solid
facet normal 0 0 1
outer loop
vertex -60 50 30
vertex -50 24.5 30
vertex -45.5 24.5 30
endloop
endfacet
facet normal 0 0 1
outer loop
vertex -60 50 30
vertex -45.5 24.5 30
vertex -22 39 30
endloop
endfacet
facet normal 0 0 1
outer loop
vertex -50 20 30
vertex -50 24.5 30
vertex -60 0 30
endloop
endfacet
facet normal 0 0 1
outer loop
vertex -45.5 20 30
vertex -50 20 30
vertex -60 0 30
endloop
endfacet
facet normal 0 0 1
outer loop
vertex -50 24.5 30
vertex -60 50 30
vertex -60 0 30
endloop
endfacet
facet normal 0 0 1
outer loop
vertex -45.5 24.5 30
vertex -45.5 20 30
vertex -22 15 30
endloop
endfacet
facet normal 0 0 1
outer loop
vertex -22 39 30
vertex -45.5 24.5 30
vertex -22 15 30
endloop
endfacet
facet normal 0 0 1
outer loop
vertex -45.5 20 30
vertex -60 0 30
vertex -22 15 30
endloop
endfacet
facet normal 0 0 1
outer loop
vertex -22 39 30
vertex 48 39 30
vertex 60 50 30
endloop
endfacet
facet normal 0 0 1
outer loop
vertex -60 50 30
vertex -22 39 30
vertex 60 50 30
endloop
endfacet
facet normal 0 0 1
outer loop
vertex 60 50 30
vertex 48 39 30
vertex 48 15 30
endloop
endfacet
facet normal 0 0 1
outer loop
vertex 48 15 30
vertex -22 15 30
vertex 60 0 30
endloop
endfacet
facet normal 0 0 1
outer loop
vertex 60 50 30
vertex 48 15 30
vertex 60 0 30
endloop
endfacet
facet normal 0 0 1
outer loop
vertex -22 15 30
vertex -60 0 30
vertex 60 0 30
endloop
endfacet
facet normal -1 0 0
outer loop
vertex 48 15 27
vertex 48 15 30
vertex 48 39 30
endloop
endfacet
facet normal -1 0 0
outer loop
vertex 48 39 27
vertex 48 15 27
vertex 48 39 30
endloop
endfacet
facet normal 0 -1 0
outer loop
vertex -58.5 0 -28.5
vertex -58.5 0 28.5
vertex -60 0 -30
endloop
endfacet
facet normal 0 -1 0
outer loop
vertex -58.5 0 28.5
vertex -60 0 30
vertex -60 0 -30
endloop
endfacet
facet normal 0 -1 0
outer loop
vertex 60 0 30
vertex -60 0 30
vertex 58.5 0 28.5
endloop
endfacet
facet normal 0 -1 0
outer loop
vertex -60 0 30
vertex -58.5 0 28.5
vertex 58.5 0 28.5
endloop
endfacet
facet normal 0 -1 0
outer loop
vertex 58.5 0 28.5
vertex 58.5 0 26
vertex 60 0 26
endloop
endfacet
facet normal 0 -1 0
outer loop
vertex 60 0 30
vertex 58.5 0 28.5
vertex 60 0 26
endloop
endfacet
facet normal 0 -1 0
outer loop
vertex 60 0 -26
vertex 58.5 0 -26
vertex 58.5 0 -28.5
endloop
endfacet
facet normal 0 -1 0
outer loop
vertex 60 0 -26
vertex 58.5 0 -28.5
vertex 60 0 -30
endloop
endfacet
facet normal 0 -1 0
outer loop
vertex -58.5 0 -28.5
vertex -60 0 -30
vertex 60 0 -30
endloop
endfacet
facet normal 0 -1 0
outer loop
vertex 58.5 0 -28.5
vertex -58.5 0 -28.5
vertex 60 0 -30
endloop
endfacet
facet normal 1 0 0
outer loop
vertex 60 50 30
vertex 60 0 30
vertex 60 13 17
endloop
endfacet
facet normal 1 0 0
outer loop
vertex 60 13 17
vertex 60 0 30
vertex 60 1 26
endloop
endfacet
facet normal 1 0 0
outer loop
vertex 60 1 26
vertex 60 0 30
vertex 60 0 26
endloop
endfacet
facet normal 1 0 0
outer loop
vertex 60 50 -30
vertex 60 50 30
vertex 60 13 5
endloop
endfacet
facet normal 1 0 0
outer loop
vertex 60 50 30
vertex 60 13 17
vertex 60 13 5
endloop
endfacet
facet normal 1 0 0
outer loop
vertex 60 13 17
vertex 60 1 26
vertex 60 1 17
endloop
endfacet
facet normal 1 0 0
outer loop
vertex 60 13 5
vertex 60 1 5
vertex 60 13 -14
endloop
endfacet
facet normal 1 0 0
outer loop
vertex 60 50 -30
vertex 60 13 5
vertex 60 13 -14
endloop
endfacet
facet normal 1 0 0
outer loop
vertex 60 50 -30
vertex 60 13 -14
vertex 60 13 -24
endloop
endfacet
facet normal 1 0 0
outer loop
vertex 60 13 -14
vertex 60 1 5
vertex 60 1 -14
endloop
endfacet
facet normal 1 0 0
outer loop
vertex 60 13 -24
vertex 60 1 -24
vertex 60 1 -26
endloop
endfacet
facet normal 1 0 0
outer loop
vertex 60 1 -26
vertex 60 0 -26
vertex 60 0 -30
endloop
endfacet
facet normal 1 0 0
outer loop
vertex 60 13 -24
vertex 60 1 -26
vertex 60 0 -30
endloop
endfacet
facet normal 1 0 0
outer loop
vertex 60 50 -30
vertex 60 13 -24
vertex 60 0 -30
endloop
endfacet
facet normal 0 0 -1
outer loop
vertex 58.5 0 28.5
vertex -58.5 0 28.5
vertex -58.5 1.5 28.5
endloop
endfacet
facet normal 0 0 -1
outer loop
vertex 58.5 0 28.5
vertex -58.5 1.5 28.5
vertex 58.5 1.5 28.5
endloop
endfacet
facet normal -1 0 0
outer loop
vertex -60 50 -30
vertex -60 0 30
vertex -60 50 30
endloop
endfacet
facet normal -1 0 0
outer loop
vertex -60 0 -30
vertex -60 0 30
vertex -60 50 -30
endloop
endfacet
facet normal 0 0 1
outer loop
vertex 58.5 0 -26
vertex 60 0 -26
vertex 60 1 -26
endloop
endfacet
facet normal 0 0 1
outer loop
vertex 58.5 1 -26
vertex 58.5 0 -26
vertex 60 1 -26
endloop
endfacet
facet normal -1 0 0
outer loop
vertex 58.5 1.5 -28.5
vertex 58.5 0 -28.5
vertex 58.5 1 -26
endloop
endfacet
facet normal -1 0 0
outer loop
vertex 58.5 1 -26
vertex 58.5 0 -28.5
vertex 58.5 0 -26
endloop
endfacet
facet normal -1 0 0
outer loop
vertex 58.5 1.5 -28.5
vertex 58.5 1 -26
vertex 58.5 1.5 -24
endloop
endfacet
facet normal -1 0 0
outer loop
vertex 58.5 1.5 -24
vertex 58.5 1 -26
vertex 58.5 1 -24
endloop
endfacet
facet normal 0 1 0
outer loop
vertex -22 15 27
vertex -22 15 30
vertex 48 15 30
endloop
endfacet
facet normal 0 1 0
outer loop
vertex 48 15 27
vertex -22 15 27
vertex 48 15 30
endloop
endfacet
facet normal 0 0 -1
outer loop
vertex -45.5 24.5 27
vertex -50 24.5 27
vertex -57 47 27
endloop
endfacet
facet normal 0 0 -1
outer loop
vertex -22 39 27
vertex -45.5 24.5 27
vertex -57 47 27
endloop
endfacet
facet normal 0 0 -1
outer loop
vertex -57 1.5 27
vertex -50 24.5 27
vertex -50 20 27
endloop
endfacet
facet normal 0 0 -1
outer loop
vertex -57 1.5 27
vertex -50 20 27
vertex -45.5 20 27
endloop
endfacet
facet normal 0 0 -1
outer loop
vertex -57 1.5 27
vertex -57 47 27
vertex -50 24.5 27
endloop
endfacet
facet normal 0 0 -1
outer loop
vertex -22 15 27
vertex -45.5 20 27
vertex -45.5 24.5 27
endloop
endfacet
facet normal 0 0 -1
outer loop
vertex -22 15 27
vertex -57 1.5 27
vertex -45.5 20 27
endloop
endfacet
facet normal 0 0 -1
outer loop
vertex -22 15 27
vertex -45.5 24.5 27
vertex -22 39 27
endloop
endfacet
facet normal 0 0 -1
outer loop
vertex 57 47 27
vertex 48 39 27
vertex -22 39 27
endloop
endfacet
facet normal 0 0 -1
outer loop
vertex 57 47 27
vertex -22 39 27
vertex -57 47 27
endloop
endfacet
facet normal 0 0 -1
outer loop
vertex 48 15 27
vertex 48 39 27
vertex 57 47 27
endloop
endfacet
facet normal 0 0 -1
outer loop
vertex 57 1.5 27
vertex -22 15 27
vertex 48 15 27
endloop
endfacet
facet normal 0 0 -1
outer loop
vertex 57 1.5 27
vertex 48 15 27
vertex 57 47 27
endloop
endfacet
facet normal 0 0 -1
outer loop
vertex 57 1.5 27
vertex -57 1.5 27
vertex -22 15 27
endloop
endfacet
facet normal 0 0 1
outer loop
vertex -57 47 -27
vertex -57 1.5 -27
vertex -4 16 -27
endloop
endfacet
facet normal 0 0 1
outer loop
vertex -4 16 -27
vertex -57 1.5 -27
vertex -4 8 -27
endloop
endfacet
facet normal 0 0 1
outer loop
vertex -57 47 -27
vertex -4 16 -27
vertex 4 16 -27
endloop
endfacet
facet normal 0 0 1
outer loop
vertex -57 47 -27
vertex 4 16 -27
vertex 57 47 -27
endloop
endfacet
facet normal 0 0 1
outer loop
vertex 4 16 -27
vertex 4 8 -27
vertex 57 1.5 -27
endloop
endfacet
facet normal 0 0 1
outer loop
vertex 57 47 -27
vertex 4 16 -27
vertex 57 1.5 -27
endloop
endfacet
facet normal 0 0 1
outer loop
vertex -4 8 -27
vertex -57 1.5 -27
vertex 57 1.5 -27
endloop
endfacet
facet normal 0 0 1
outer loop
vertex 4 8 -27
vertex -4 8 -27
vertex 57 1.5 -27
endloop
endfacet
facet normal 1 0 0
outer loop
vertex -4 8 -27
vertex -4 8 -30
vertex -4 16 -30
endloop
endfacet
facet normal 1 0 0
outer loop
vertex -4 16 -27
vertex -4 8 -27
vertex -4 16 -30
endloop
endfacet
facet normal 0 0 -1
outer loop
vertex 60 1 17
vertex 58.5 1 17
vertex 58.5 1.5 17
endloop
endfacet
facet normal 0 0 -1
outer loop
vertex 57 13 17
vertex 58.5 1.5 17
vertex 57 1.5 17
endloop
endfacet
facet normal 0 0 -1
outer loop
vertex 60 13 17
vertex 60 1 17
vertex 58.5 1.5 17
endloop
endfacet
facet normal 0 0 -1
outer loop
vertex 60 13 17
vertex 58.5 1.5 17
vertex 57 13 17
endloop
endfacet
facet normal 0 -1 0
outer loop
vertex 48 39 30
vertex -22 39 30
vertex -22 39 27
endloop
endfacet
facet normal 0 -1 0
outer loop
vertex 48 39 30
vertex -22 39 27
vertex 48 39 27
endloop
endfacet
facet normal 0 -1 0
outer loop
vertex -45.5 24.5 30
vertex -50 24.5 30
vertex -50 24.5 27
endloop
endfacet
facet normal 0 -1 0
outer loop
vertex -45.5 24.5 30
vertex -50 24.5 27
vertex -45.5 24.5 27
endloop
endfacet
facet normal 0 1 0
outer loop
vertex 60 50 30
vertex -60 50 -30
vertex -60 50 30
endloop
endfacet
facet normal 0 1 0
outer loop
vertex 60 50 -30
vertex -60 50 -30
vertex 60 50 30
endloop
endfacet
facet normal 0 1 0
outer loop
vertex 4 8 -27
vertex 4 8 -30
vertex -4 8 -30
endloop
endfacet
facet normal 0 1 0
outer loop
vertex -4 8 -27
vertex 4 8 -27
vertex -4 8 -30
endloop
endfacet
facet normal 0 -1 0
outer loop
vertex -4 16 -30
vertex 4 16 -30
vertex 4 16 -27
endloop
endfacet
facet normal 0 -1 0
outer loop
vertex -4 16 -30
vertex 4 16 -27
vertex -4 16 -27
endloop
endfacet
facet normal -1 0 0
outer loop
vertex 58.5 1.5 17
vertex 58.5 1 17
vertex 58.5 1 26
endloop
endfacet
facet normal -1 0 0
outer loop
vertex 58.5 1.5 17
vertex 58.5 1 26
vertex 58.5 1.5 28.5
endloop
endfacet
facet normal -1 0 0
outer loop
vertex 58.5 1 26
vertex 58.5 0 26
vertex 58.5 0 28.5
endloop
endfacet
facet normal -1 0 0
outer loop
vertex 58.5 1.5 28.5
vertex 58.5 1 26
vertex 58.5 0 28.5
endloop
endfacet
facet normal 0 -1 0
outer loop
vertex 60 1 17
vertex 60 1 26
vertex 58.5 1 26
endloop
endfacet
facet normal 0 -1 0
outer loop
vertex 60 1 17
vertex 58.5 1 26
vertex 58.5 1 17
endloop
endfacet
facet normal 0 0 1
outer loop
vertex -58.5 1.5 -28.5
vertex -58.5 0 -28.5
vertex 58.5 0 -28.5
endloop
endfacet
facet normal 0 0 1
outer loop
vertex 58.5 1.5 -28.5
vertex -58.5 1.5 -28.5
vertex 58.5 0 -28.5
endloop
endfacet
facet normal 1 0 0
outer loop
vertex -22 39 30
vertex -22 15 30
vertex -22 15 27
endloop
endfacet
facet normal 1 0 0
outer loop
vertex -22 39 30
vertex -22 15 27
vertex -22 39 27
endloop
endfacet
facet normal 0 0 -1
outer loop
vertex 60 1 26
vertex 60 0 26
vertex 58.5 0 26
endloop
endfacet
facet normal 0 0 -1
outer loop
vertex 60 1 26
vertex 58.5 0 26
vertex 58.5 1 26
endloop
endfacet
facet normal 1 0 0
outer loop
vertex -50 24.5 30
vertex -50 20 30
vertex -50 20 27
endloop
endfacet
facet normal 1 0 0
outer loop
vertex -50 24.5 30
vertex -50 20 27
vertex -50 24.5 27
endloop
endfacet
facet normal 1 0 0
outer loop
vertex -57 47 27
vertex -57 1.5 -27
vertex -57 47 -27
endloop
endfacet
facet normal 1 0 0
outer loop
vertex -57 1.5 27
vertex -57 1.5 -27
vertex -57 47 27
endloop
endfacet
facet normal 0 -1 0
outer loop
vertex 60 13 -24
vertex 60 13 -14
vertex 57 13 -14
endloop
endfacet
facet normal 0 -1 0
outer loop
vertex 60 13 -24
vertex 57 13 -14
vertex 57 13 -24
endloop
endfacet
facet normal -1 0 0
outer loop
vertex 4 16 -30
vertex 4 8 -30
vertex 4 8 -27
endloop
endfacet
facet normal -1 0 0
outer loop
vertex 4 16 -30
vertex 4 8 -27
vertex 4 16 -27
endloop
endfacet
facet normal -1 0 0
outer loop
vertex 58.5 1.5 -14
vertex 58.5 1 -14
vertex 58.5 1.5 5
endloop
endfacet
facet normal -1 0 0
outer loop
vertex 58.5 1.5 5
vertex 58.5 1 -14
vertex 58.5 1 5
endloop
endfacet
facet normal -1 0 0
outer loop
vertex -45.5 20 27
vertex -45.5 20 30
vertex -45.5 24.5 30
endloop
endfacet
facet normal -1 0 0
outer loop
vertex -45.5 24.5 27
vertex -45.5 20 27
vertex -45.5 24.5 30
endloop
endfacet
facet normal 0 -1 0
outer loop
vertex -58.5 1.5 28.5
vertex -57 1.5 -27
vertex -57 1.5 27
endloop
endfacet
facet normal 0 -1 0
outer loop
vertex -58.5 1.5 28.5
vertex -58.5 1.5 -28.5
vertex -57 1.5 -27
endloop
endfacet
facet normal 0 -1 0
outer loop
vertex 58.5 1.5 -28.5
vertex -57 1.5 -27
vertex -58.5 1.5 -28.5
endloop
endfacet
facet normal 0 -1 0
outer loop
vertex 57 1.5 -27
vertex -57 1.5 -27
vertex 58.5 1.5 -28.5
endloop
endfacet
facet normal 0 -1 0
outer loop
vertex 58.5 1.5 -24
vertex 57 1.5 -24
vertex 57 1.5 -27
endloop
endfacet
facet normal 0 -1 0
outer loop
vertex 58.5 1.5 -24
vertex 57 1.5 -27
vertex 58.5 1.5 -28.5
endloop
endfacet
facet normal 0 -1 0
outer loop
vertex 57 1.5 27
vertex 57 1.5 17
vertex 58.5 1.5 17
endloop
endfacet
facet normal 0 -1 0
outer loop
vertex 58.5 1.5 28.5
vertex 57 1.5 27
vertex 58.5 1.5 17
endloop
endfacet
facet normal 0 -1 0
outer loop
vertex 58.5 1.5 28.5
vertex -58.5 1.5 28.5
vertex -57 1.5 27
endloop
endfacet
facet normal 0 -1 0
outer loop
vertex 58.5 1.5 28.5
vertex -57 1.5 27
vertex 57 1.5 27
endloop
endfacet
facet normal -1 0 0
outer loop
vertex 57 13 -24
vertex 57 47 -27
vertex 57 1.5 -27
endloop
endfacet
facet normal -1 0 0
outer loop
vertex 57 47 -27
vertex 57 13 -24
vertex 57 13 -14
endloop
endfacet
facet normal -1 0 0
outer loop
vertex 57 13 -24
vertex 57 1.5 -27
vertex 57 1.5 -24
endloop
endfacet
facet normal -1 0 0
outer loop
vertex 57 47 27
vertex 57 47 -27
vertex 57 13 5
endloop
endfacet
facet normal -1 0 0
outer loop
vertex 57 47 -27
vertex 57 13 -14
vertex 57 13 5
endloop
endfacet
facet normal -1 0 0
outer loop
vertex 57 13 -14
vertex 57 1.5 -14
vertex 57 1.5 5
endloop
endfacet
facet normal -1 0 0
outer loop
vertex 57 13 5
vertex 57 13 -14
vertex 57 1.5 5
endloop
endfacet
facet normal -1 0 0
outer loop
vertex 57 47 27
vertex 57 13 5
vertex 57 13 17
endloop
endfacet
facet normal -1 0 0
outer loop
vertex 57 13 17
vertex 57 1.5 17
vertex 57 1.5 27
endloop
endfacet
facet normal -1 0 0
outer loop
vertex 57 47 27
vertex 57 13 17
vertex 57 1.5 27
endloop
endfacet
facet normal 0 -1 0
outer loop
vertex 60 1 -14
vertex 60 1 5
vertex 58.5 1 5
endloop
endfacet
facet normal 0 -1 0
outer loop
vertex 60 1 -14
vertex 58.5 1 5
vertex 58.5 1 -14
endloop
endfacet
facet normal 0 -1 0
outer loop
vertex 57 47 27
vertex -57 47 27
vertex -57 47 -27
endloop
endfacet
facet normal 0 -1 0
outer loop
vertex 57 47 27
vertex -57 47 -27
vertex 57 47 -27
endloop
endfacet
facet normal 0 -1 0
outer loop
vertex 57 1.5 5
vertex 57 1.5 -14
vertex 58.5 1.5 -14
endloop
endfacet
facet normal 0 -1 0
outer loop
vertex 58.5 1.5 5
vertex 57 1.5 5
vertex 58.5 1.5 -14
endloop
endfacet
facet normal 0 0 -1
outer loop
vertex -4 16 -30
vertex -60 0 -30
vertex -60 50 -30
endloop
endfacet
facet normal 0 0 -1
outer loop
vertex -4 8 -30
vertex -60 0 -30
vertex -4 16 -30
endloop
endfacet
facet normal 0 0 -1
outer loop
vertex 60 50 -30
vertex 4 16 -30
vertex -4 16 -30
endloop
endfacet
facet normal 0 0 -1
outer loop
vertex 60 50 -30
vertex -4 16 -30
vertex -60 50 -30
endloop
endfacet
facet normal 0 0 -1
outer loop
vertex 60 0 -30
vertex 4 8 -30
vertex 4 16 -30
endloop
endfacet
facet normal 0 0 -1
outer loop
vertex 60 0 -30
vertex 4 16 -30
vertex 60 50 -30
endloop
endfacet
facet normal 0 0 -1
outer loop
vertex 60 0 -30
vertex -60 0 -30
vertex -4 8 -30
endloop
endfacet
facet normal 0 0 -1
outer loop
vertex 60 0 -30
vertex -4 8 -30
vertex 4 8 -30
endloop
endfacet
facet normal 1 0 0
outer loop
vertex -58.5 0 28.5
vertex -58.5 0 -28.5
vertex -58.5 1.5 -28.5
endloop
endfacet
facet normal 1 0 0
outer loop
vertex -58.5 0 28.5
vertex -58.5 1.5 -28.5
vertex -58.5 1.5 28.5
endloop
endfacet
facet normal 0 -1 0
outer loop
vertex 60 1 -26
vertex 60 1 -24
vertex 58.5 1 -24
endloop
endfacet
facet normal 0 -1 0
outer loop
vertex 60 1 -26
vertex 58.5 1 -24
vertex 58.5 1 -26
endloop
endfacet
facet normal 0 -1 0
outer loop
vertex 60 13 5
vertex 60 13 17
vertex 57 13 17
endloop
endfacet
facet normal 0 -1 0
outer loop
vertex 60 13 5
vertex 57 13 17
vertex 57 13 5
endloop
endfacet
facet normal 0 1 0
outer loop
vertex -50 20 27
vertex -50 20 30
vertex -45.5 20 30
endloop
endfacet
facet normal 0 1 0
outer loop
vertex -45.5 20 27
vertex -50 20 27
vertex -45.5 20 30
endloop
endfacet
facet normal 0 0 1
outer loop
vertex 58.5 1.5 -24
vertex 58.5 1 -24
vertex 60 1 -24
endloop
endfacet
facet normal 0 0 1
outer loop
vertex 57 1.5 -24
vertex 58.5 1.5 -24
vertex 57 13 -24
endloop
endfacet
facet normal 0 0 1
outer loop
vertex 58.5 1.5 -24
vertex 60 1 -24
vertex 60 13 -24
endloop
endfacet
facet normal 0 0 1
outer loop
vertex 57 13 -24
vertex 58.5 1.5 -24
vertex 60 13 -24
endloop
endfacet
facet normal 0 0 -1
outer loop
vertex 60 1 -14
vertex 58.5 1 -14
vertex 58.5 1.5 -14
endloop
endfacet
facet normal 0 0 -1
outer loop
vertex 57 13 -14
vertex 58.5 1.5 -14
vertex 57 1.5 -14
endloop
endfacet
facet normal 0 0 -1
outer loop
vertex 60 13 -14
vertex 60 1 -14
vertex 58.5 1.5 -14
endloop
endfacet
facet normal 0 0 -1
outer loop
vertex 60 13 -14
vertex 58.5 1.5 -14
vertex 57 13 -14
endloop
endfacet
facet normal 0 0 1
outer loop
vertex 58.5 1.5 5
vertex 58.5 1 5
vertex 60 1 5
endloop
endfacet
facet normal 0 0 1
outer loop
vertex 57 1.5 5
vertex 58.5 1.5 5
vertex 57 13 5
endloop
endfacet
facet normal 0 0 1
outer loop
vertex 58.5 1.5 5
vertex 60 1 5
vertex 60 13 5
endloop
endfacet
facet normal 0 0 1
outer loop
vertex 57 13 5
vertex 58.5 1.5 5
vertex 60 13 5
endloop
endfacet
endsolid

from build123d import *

# Parameters (mm, degrees)
SKETCH1_W           = 120
SKETCH1_H           = 60
BOSS_EXTRUDE1_DEPTH = 50
SKETCH2_W           = 114
SKETCH2_H           = 54
CUT_EXTRUDE1_DEPTH  = 47
SKETCH5_W           = 70
SKETCH5_H           = 24
CUT_EXTRUDE3_DEPTH  = 7
SKETCH6_W           = 4.5
SKETCH6_H           = 4.5
CUT_EXTRUDE4_DEPTH  = 7
SKETCH7_W           = 12
SKETCH7_H           = 13
SKETCH7_W_2         = 10
CUT_EXTRUDE5_DEPTH  = 3
SKETCH8_W           = 52
SKETCH8_H           = 2
CUT_EXTRUDE6_DEPTH  = 13
SKETCH9_W           = 117
SKETCH9_H           = 57
CUT_EXTRUDE7_DEPTH  = 1.5
SKETCH10_W          = 8
SKETCH10_H          = 8
CUT_EXTRUDE8_DEPTH  = 11.5


with BuildPart() as part:
    # Sketch1 → Boss-Extrude1 (new body)
    with BuildSketch(Plane(origin=(0, 0, 0), x_dir=(1, 0, 0), z_dir=(0, 1, 0))):
        Rectangle(SKETCH1_W, SKETCH1_H)
    extrude(amount=BOSS_EXTRUDE1_DEPTH)

    # Sketch2 → Cut-Extrude1 (cut)
    with BuildSketch(Plane.XZ):
        Rectangle(SKETCH2_W, SKETCH2_H)
    extrude(amount=-CUT_EXTRUDE1_DEPTH, mode=Mode.SUBTRACT)

    # Sketch5 → Cut-Extrude3 (cut)
    with BuildSketch(Plane.XY.offset(30)):
        with Locations((13, 27)):
            Rectangle(SKETCH5_W, SKETCH5_H)
    extrude(amount=-CUT_EXTRUDE3_DEPTH, mode=Mode.SUBTRACT)

    # Sketch6 → Cut-Extrude4 (cut)
    with BuildSketch(Plane.XY.offset(30)):
        with Locations((-47.75, 22.25)):
            Rectangle(SKETCH6_W, SKETCH6_H)
    extrude(amount=-CUT_EXTRUDE4_DEPTH, mode=Mode.SUBTRACT)

    # Sketch7 → Cut-Extrude5 (cut)
    with BuildSketch(Plane(origin=(60, 0, 0), x_dir=(0, 0, -1), z_dir=(1, 0, 0))):
        with Locations((-11, 6.5)):
            Rectangle(SKETCH7_W, SKETCH7_H)
        with Locations((19, 6.5)):
            Rectangle(SKETCH7_W_2, SKETCH7_H)
    extrude(amount=-CUT_EXTRUDE5_DEPTH, mode=Mode.SUBTRACT)

    # Sketch8 → Cut-Extrude6 (cut)
    with BuildSketch(Plane(origin=(60, 0, 0), x_dir=(0, 0, -1), z_dir=(1, 0, 0))):
        Rectangle(SKETCH8_W, SKETCH8_H)
    extrude(amount=-CUT_EXTRUDE6_DEPTH, mode=Mode.SUBTRACT)

    # Sketch9 → Cut-Extrude7 (cut)
    with BuildSketch(Plane.XZ):
        Rectangle(SKETCH9_W, SKETCH9_H)
    extrude(amount=-CUT_EXTRUDE7_DEPTH, mode=Mode.SUBTRACT)

    # Sketch10 → Cut-Extrude8 (cut)
    with BuildSketch(Plane(origin=(0, 0, -30), x_dir=(-1, 0, 0), z_dir=(0, 0, -1))):
        with Locations((0, 12)):
            Rectangle(SKETCH10_W, SKETCH10_H)
    extrude(amount=-CUT_EXTRUDE8_DEPTH, mode=Mode.SUBTRACT)


solid = part.part
